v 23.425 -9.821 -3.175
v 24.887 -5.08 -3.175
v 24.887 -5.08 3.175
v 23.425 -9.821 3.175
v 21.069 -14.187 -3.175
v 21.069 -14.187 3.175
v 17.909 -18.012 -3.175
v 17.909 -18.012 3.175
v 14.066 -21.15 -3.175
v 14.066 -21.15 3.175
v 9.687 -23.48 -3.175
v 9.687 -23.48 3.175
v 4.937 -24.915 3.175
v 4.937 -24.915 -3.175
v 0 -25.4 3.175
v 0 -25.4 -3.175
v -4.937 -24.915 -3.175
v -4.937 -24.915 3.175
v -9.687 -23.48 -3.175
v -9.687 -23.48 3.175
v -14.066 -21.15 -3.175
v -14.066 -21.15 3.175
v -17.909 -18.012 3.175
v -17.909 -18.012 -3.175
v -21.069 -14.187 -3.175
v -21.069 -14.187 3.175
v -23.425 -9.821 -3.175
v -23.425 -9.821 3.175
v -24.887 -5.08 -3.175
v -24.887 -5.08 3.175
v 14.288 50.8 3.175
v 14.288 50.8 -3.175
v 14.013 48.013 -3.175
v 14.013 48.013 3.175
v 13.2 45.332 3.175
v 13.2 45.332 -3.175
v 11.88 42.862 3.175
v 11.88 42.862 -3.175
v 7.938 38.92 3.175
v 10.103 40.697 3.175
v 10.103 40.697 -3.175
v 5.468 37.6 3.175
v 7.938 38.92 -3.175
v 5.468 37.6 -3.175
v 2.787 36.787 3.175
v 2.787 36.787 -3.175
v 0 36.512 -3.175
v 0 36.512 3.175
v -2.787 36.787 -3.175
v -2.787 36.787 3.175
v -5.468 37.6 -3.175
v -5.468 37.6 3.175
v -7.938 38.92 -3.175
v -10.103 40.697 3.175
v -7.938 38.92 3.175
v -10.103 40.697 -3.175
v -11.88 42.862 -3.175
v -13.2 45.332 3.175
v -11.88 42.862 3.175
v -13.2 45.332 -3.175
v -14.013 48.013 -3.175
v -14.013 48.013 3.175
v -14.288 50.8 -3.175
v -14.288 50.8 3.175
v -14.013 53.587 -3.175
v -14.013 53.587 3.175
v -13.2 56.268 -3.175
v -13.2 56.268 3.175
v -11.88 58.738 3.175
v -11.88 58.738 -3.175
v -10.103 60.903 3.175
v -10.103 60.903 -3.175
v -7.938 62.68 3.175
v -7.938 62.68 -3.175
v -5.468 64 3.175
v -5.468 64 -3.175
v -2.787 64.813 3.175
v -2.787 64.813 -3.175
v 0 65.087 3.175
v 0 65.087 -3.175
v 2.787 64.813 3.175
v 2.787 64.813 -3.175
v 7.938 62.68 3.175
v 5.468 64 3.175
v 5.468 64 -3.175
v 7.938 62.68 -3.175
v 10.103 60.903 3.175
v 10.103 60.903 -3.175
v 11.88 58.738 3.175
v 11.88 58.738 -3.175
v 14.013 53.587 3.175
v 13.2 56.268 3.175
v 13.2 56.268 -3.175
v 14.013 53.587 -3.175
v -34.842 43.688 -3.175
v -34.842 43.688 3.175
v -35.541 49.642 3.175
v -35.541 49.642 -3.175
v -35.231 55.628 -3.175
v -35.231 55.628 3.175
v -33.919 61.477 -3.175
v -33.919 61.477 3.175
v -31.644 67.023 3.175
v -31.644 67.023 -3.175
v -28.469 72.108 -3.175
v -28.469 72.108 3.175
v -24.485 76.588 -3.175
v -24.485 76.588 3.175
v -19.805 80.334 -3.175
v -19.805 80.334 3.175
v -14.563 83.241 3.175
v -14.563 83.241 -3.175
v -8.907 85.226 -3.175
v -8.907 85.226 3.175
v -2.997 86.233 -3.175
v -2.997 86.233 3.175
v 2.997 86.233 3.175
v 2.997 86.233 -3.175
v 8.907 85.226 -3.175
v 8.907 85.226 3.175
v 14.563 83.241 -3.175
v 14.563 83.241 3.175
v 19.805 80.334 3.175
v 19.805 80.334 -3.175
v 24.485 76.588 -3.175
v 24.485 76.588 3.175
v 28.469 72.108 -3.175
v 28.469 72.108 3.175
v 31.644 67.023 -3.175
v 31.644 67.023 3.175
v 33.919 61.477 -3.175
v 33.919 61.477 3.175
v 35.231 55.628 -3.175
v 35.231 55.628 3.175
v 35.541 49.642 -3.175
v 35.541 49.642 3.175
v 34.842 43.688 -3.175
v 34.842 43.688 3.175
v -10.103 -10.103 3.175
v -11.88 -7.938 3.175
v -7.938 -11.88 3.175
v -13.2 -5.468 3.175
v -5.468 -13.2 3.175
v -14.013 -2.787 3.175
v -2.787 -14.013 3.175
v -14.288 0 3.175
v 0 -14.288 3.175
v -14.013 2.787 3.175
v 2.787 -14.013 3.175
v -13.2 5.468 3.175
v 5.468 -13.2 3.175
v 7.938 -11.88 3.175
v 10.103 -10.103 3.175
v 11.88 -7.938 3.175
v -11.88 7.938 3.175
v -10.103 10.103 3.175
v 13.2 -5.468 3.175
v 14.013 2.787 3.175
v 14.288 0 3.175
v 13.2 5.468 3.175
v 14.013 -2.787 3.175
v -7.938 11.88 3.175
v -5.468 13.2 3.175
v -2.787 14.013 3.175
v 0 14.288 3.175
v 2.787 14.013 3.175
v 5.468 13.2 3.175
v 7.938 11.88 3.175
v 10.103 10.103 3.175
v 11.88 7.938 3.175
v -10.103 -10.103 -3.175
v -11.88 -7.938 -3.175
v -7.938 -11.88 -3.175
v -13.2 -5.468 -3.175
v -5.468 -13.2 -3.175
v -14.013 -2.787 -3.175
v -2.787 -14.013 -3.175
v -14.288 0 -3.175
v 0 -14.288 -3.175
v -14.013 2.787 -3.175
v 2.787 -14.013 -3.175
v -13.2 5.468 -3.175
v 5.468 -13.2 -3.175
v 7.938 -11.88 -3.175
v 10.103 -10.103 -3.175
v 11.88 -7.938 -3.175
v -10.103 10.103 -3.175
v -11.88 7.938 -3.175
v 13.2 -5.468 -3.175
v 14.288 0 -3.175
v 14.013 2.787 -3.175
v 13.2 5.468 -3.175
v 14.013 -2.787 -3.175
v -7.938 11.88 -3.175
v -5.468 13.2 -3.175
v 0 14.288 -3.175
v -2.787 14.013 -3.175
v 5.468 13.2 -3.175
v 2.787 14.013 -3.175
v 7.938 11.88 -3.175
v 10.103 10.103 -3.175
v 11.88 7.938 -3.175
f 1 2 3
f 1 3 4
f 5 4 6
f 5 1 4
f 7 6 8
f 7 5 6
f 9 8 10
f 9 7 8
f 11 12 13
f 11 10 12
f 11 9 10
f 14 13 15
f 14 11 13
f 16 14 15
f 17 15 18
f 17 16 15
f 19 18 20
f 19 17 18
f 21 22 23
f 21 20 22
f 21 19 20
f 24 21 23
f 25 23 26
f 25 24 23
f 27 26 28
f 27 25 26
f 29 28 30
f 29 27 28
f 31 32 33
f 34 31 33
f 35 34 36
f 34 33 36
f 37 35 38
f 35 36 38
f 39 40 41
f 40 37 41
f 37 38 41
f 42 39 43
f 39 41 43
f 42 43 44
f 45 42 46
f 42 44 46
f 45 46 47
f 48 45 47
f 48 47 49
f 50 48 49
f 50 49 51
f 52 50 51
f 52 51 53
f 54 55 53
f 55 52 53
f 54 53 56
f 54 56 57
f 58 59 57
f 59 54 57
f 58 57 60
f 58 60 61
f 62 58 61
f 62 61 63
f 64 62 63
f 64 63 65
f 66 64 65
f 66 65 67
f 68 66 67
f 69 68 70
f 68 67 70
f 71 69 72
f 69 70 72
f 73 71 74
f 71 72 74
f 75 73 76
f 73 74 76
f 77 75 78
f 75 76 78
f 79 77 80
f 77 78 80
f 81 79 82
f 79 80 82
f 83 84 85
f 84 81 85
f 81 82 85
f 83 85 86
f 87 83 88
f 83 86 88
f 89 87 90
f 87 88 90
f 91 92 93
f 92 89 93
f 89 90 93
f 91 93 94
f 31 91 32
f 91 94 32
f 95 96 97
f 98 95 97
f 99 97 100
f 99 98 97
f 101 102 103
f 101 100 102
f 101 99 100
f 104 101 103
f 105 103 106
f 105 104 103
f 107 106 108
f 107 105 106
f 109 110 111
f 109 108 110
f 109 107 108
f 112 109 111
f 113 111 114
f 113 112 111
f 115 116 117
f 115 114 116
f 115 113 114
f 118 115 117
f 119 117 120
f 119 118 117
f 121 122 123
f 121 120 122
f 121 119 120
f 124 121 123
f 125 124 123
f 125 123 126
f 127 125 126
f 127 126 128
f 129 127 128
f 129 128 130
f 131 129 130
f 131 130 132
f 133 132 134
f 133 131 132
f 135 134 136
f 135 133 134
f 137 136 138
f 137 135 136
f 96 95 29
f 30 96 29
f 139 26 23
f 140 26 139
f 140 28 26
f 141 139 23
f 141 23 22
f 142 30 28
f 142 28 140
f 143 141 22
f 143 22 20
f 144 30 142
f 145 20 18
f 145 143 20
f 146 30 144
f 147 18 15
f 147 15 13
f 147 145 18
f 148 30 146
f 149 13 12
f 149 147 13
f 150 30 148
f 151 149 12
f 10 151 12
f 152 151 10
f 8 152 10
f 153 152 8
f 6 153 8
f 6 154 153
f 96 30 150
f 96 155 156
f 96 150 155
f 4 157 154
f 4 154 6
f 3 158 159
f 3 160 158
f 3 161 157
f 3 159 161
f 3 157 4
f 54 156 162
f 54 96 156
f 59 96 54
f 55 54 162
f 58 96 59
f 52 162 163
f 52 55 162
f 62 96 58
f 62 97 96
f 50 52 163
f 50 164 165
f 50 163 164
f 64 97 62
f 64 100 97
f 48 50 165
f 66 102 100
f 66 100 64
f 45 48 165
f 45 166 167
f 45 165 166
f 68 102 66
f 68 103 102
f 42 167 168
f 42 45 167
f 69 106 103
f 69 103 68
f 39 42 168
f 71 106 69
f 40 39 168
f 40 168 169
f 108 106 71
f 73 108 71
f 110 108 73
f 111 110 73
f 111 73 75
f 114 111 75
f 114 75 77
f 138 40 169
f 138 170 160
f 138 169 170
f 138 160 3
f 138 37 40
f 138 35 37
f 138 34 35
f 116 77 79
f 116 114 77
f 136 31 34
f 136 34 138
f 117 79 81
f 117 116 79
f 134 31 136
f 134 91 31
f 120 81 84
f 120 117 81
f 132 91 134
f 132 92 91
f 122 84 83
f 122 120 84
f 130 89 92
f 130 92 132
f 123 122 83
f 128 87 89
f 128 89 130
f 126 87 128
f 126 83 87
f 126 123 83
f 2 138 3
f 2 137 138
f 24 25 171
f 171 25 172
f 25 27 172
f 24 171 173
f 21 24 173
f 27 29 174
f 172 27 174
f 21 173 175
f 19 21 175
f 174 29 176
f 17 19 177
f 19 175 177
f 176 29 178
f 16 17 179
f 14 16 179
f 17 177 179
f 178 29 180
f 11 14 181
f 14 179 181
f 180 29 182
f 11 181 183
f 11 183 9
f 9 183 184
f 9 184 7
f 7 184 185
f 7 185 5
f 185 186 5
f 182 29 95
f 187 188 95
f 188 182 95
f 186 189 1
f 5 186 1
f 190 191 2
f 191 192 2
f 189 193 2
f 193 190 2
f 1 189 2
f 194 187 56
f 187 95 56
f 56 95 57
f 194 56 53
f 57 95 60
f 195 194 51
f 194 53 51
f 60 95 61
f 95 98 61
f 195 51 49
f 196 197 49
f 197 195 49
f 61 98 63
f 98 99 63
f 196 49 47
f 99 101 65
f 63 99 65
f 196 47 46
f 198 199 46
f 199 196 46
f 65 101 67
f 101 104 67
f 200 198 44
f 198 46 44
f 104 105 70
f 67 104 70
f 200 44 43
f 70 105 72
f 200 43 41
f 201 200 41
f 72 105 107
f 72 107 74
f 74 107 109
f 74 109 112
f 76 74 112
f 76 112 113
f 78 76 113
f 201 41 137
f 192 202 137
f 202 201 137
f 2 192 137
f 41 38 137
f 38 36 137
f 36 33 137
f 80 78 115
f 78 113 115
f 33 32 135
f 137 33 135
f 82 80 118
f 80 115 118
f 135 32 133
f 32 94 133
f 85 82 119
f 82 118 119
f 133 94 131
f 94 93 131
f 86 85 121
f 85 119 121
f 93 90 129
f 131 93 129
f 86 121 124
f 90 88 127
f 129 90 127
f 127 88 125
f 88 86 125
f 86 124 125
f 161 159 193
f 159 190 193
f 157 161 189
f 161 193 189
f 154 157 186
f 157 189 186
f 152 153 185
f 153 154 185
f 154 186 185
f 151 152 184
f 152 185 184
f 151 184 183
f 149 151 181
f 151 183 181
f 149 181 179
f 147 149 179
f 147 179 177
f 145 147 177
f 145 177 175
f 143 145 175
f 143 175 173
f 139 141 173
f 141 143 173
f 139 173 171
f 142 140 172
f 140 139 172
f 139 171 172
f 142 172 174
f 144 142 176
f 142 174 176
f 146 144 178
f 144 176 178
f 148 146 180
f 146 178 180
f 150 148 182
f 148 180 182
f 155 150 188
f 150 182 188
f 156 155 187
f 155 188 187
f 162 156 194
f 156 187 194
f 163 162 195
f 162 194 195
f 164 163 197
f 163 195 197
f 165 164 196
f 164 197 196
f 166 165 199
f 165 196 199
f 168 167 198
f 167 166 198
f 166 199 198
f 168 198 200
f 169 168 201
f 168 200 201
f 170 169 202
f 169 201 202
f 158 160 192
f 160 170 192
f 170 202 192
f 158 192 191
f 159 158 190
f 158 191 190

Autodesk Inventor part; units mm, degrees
ref_plane "YZ Plane" through (0, 0, 0) normal (1, 0, 0) x (0, 1, 0)
ref_plane "XZ Plane" through (0, 0, 0) normal (0, 1, 0) x (-1, 0, 0)
ref_plane "XY Plane" through (0, 0, 0) normal (0, 0, 1) x (1, 0, 0)
sketch "Sketch1" plane through (0, 0, 0) normal (0, 0, 1) x (1, 0, 0)
  circle A0 centre (0, 0) radius 14.2875
  circle A1 centre (0, 0) radius 20.32 construction
  circle A2 centre (0, 50.8) radius 30.48 construction
  circle A3 centre (0, 50.8) radius 14.2875
  circle A4 centre (0, 50.8) radius 35.56 construction
  circle A5 centre (0, 0) radius 25.4 construction
  line L0 (34.8415, 43.688) -> (24.8868, -5.08)
  line L1 (-34.8415, 43.688) -> (-24.8868, -5.08)
  arc A6 (34.8415, 43.688) -> (-34.8415, 43.688) centre (0, 50.8) ccw
  arc A7 (-24.8868, -5.08) -> (24.8868, -5.08) centre (0, 0) ccw
  dimension "d0" = 28.575
  dimension "d2" = 40.64
  dimension "d6" = 60.96
  dimension "d7" = 28.575
  dimension "d9" = 5.08
  dimension "d10" = 5.08
extrude "Extrusion1" add sketch "Sketch1" along normal mid plane 6.35
properties part number "Revised Gearbox Plate #1" material "Aluminum 6061"
